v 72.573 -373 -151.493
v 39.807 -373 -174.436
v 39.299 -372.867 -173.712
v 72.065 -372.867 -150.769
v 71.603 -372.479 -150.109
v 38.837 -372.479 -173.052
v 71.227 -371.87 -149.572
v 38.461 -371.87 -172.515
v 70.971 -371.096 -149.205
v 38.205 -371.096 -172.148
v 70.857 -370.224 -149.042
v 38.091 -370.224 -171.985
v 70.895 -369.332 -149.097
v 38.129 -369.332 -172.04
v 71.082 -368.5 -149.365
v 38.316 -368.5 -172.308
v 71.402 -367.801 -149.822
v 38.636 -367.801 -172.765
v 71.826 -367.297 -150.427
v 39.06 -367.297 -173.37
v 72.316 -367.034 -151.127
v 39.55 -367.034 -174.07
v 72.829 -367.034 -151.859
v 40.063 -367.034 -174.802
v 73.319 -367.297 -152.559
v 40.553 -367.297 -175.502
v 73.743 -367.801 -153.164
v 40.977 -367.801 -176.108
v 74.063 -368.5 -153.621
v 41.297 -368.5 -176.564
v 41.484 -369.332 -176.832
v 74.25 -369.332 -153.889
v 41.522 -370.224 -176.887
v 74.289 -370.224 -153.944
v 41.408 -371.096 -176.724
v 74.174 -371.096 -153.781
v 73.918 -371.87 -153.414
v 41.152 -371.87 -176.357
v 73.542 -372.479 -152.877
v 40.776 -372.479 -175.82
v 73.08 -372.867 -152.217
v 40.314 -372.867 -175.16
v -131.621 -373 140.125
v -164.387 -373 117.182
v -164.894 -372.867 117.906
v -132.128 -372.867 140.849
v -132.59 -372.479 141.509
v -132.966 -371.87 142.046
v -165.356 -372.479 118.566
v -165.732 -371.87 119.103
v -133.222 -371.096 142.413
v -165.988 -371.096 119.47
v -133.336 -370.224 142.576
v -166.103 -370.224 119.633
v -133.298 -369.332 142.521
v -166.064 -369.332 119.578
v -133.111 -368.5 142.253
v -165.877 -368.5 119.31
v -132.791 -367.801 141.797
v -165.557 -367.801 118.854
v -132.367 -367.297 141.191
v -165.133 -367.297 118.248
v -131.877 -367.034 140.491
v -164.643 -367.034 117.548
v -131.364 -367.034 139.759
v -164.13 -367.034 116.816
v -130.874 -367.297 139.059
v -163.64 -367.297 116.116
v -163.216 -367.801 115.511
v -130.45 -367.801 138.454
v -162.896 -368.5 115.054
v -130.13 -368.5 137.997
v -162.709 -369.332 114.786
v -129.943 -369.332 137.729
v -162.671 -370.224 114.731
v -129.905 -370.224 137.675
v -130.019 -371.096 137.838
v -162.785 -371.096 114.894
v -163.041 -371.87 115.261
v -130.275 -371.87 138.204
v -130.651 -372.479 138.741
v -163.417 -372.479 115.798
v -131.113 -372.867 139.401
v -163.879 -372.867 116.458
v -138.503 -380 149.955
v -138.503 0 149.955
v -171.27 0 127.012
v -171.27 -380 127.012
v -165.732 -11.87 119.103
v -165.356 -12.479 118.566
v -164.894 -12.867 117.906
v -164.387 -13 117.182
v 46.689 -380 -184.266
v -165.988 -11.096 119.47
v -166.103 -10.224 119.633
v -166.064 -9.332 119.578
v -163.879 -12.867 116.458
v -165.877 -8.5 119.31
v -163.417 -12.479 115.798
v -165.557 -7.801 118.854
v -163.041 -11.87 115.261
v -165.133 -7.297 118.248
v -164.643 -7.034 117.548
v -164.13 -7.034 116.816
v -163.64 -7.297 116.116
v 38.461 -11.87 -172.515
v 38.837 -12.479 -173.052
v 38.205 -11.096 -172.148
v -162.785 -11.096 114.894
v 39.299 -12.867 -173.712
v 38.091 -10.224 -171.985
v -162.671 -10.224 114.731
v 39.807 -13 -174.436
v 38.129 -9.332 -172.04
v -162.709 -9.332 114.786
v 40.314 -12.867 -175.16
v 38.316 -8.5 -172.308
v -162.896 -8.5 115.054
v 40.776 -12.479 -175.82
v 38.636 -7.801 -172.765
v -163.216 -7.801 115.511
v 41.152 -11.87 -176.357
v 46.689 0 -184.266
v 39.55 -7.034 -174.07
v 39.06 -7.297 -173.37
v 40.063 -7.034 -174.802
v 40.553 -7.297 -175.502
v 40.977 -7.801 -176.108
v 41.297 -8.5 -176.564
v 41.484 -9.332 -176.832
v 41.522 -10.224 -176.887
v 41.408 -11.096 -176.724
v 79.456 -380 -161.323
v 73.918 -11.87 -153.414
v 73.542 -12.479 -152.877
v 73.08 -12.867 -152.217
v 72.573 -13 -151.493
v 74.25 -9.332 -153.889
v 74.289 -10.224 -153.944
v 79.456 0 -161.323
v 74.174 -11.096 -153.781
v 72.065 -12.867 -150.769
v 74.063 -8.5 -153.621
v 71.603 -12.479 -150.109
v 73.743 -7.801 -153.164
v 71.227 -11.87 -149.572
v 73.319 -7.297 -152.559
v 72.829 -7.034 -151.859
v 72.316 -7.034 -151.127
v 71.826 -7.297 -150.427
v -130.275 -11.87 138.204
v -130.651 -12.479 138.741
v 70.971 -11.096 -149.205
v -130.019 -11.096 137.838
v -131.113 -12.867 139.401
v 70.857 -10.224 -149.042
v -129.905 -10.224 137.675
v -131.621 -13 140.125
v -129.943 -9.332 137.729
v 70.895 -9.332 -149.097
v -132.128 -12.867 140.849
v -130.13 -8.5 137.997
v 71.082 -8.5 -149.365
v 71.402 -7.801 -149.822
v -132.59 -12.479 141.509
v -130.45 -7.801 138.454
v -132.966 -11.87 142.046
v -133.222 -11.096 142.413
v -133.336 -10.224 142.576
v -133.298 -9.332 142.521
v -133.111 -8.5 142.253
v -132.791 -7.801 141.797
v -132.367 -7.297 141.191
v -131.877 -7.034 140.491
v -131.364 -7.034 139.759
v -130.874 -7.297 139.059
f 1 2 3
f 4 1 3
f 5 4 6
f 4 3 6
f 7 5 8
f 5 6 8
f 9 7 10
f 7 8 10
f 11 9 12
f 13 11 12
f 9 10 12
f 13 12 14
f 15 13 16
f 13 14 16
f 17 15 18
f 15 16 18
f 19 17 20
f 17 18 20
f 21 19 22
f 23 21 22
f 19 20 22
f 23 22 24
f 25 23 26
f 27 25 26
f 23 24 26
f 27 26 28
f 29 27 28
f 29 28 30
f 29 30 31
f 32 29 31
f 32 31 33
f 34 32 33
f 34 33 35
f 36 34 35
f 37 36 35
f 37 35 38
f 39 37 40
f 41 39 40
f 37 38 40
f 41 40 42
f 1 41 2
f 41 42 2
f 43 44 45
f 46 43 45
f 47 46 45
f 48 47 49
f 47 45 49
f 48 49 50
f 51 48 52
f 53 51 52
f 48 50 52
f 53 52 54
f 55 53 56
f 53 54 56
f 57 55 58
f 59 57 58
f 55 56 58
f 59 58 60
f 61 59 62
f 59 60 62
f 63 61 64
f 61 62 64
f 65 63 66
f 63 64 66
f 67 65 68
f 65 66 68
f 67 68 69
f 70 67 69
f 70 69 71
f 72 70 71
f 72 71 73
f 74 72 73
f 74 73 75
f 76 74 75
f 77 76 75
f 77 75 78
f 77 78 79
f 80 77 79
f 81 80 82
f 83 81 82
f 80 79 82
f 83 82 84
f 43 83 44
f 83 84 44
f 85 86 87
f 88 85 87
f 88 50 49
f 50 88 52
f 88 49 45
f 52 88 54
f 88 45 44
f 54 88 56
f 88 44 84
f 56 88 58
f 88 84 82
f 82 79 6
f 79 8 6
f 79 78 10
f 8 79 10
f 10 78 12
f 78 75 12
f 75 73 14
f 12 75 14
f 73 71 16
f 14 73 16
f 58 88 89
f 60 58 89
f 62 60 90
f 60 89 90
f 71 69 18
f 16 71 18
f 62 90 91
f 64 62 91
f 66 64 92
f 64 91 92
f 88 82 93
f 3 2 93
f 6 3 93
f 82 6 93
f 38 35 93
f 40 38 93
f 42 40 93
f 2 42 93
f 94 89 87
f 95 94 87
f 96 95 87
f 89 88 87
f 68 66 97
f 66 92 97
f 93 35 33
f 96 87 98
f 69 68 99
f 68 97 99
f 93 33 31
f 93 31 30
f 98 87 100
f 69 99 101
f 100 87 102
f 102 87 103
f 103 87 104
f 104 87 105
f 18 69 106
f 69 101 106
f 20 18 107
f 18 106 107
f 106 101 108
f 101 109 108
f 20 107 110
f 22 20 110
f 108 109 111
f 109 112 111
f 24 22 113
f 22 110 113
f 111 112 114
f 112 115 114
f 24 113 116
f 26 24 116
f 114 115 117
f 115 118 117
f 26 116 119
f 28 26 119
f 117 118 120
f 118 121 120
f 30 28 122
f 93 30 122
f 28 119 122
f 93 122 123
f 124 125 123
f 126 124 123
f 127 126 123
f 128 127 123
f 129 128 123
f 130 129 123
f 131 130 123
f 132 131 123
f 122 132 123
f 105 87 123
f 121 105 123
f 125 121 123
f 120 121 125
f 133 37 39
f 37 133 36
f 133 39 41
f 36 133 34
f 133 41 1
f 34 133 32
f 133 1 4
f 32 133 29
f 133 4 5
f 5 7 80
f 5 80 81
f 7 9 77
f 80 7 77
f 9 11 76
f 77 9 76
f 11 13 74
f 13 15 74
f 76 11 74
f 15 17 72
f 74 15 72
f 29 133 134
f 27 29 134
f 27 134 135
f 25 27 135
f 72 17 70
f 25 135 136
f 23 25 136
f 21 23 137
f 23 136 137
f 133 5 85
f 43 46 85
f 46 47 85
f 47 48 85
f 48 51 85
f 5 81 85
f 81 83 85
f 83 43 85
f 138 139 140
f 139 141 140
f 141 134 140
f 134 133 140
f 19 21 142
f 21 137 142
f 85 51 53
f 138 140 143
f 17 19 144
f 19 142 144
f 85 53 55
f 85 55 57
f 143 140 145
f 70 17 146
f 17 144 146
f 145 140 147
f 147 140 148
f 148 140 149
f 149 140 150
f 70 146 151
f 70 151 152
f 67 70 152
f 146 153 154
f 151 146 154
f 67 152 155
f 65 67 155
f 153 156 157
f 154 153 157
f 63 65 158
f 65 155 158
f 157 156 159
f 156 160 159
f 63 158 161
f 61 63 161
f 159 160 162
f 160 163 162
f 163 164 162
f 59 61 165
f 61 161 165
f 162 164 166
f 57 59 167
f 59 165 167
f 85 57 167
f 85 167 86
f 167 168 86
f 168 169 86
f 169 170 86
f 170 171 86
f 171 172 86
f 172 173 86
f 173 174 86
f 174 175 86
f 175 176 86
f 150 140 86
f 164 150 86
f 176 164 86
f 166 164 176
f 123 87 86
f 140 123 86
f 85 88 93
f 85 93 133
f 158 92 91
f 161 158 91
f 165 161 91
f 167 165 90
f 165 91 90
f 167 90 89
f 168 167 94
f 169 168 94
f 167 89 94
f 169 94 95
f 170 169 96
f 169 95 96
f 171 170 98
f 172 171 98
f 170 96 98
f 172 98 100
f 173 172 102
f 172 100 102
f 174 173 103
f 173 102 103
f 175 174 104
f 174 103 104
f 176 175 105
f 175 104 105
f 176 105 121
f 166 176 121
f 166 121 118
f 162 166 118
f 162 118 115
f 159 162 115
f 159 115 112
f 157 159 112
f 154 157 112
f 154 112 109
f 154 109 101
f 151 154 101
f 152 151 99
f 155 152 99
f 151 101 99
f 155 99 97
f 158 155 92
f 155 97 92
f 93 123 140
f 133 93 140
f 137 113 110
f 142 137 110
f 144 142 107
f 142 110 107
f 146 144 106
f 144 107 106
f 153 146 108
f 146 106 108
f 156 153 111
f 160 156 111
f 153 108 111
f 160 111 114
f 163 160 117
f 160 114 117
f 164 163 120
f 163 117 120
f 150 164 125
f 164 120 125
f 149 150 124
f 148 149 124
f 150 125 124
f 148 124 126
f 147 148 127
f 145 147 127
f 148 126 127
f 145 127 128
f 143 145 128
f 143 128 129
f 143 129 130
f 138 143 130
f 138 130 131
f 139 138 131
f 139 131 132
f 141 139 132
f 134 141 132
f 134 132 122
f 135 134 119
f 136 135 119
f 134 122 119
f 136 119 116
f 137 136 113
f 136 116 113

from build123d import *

# Parameters (mm, degrees)
F1_DEPTH = 380
F2_R     = 3
F3_DEPTH = 40


with BuildPart() as f1:
    # F0 (on Front) → F1 (new body)
    with BuildSketch(Plane.XZ):
        Polygon((79.4555794589, -161.3228202568), (-138.5034663545, 149.954956573), (-171.269548126, 127.011899119), (46.6894976874, -184.2658777108), align=None)
    extrude(amount=F1_DEPTH)

    # F2 (on face) → F3 (cut, through all)
    with BuildSketch(Plane(origin=(-55.2475195846, 0, -38.6847296806), x_dir=(0, -1, 0), z_dir=(-0.8191520443, 0, -0.5735764364))):
        with Locations((370, 190.2782338819)):
            Circle(F2_R)
        with Locations((370, -165.7217661181)):
            Circle(F2_R)
        with Locations((10, -165.7217661181)):
            Circle(F2_R)
        with Locations((10, 190.2782338819)):
            Circle(F2_R)
    extrude(amount=-F3_DEPTH, mode=Mode.SUBTRACT)


solid = f1.part
